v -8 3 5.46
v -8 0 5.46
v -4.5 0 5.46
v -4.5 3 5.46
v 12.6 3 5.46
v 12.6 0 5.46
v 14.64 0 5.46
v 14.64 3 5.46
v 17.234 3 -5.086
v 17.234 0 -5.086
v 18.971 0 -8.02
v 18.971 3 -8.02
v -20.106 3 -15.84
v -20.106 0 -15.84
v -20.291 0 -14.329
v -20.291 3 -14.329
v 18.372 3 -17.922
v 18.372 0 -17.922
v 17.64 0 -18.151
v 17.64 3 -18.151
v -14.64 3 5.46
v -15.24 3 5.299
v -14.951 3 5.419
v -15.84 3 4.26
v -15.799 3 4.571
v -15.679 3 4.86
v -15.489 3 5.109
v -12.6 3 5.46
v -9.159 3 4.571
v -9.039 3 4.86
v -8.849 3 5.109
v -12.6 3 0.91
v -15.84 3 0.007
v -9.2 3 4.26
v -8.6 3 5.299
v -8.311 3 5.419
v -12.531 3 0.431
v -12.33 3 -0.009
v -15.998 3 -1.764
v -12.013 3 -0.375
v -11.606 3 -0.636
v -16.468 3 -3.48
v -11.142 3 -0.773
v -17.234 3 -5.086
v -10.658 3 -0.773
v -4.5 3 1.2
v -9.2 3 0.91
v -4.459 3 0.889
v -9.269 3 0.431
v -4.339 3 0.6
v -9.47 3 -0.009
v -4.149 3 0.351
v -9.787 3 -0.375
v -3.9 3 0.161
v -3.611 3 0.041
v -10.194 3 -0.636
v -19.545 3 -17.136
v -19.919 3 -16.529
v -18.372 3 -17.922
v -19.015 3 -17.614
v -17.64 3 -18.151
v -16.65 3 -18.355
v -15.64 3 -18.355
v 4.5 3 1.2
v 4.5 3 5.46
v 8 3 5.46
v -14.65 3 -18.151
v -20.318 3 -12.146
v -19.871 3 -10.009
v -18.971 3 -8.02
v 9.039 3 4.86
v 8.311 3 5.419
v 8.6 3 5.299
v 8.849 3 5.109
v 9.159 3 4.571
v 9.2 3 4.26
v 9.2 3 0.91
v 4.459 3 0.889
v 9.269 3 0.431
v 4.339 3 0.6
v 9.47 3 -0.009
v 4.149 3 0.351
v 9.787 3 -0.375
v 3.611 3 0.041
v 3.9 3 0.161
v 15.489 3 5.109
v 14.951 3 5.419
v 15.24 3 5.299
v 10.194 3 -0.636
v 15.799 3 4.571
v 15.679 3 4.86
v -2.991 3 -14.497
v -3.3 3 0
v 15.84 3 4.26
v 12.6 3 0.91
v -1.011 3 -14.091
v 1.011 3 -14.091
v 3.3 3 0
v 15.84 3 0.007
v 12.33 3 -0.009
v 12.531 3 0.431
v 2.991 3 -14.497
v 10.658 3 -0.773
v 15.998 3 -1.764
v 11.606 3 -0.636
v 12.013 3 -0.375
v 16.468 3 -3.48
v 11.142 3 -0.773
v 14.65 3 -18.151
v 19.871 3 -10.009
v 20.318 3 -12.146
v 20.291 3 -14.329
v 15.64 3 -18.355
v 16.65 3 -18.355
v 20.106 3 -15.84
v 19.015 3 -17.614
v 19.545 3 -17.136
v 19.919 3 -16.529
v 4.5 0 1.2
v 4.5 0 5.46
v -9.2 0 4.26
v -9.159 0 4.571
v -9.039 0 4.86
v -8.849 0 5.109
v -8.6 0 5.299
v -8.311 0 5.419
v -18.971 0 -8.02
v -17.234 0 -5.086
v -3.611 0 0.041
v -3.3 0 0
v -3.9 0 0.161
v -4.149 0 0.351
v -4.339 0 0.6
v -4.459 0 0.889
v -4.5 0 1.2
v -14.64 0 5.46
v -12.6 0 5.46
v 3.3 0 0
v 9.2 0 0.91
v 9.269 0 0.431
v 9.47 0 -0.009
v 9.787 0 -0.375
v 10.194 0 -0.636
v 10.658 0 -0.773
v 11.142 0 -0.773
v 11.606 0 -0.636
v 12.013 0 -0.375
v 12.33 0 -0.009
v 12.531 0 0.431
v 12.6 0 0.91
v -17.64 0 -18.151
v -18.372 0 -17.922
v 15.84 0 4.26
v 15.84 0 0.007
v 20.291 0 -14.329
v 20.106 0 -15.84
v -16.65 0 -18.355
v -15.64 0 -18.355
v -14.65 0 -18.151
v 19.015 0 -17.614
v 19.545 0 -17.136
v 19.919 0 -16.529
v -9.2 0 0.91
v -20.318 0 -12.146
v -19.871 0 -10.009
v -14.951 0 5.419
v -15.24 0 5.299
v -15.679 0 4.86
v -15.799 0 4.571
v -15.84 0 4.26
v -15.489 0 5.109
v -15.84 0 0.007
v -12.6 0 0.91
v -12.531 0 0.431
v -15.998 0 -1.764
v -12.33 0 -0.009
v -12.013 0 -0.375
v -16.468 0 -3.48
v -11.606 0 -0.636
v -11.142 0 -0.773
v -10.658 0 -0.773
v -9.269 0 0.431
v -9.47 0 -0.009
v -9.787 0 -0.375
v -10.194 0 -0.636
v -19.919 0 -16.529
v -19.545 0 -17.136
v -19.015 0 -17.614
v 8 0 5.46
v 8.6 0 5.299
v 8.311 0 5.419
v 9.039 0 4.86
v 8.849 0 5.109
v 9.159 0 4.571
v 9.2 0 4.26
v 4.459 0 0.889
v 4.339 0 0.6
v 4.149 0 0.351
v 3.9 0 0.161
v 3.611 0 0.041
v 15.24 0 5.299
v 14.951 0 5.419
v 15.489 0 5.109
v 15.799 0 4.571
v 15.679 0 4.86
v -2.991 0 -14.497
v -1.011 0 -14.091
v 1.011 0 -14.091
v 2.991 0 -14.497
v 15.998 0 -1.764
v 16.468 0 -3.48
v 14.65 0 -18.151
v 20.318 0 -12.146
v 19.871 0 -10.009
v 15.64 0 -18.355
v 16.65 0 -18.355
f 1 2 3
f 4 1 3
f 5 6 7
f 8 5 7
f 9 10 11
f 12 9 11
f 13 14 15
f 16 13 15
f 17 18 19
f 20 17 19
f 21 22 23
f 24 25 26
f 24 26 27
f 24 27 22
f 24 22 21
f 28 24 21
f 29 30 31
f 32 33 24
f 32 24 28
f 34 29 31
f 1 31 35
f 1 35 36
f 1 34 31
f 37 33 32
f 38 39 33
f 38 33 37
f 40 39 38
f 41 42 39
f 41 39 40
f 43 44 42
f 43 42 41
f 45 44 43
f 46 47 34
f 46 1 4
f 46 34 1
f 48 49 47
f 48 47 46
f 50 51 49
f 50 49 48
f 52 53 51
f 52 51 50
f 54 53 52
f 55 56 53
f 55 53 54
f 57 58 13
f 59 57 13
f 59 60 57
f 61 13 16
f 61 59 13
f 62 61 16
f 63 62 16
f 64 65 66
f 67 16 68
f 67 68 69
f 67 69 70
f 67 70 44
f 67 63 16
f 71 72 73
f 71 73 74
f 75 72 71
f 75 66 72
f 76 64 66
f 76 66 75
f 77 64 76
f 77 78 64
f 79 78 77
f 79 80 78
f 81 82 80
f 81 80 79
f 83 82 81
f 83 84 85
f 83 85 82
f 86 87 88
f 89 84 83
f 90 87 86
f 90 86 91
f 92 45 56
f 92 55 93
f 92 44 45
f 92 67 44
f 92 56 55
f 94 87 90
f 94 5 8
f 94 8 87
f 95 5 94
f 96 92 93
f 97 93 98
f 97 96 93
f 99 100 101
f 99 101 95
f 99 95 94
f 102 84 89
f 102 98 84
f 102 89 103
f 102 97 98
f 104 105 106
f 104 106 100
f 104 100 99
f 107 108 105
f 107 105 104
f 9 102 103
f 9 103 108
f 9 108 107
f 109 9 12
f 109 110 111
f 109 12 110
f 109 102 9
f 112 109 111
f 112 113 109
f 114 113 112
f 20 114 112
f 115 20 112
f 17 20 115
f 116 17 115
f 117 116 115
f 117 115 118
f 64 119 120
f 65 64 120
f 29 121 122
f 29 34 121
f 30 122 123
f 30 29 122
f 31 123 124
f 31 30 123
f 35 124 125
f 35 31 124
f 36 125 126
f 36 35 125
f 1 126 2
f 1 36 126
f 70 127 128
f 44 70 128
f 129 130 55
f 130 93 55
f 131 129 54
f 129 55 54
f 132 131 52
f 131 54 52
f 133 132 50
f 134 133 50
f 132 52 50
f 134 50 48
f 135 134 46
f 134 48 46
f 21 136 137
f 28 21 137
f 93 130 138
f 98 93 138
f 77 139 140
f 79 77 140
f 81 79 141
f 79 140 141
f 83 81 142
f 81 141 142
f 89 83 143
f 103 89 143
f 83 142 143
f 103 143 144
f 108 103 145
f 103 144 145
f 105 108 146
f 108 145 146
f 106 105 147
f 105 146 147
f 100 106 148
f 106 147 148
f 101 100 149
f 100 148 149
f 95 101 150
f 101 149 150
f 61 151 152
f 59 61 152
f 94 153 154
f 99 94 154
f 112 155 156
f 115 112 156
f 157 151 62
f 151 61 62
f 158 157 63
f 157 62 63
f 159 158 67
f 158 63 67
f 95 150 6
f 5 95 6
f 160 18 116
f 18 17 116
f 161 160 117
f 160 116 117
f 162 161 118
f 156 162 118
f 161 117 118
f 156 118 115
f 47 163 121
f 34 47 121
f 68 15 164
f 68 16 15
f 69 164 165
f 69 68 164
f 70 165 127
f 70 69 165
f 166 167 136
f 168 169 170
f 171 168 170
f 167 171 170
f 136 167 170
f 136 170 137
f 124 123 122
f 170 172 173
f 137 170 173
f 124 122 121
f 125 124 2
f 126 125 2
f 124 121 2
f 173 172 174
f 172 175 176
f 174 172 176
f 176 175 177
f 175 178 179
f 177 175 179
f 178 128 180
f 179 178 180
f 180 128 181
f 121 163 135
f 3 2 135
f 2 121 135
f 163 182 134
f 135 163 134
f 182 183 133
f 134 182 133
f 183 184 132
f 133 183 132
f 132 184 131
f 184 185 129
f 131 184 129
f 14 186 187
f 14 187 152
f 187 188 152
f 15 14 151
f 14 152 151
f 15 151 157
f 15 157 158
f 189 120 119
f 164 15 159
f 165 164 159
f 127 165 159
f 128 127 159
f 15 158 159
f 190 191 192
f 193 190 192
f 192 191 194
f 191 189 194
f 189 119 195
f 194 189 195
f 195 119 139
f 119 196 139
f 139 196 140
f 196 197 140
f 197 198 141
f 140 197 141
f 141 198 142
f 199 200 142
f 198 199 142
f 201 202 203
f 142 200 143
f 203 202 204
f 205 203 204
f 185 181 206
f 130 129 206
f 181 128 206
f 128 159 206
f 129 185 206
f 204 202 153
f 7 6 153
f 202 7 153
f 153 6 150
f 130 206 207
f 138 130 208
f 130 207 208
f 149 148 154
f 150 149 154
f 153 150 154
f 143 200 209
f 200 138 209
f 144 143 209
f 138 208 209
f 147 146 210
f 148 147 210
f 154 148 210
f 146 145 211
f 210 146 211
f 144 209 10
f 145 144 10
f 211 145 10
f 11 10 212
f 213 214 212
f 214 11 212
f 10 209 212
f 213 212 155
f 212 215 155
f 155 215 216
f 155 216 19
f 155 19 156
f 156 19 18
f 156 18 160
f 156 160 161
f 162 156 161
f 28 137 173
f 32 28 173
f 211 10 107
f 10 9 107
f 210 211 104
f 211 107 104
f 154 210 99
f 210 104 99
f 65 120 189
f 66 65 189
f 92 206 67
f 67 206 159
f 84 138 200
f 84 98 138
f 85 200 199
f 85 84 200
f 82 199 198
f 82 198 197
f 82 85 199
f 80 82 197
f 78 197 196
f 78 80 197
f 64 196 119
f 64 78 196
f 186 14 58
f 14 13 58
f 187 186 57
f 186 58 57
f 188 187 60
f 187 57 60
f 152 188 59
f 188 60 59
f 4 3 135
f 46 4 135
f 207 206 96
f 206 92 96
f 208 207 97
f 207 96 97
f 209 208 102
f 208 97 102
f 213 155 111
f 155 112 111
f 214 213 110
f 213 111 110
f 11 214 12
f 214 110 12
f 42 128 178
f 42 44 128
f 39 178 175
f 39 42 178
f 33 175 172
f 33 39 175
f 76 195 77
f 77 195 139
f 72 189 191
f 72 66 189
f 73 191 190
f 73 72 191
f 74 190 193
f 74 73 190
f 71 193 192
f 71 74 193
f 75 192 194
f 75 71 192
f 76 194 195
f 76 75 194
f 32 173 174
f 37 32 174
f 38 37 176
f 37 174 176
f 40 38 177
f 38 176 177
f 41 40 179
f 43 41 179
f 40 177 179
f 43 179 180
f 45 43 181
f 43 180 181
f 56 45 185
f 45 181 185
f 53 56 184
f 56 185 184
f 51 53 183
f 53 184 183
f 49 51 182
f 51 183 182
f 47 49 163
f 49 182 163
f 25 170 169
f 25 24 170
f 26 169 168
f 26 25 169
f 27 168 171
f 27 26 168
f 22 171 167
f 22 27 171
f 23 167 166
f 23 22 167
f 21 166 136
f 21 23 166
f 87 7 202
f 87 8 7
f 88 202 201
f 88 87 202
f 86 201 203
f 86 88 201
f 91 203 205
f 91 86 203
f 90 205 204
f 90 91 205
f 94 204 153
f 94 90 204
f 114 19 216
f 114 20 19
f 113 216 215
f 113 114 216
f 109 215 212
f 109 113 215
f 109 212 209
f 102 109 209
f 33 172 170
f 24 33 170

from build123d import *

# Parameters (mm, degrees)
BOSS_EXTRUDE1_DEPTH = 3
FILLET1_R           = 1.2
FILLET2_R           = 5
FILLET3_R           = 10
FILLET4_R           = 2.5


with BuildPart() as part:
    # Sketch1 → Boss-Extrude1 (new body)
    with BuildSketch(Plane(origin=(0, 0, 0), x_dir=(1, 0, 0), z_dir=(0, 1, 0))):
        with BuildLine():
            Line((-4.5, 0), (4.5, 0))
            Line((4.5, 0), (4.5, -5.46))
            Line((4.5, -5.46), (9.2, -5.46))
            Line((9.2, -5.46), (9.2, -0.91))
            ThreePointArc((9.2, -0.91), (10.9, 0.79), (12.6, -0.91))
            Line((12.6, -0.91), (12.6, -5.46))
            Line((12.6, -5.46), (15.84, -5.46))
            Line((15.84, -5.46), (15.84, 2.73))
            Line((15.84, 2.73), (20.705, 10.95))
            Line((20.705, 10.95), (19.91, 17.44))
            Line((19.91, 17.44), (16.145, 18.62))
            Line((16.145, 18.62), (0, 13.56))
            Line((0, 13.56), (-16.145, 18.62))
            Line((-16.145, 18.62), (-19.91, 17.44))
            Line((-19.91, 17.44), (-20.705, 10.95))
            Line((-20.705, 10.95), (-15.84, 2.73))
            Line((-15.84, 2.73), (-15.84, -5.46))
            Line((-15.84, -5.46), (-12.6, -5.46))
            Line((-12.6, -5.46), (-12.6, -0.91))
            ThreePointArc((-12.6, -0.91), (-10.9, 0.79), (-9.2, -0.91))
            Line((-9.2, -0.91), (-9.2, -5.46))
            Line((-9.2, -5.46), (-4.5, -5.46))
            Line((-4.5, -5.46), (-4.5, 0))
        make_face()
    extrude(amount=BOSS_EXTRUDE1_DEPTH)

    # Fillet1
    fillet1_edges = [part.edges().sort_by_distance(p)[0] for p in [
        (4.5, 1.5, 0),
        (-4.5, 1.5, 0),
        (-9.2, 1.5, 5.46),
        (-15.84, 1.5, 5.46),
        (15.84, 1.5, 5.46),
        (9.2, 1.5, 5.46),
    ]]
    fillet(fillet1_edges, radius=FILLET1_R)

    # Fillet2
    fillet2_edges = [part.edges().sort_by_distance(p)[0] for p in [
        (-16.145, 1.5, -18.62),
        (16.145, 1.5, -18.62),
    ]]
    fillet(fillet2_edges, radius=FILLET2_R)

    # Fillet3
    fillet3_edges = [part.edges().sort_by_distance(p)[0] for p in [
        (-15.84, 1.5, -2.73),
        (-20.705, 1.5, -10.95),
        (0, 1.5, -13.56),
        (20.705, 1.5, -10.95),
        (15.84, 1.5, -2.73),
    ]]
    fillet(fillet3_edges, radius=FILLET3_R)

    # Fillet4
    fillet4_edges = [part.edges().sort_by_distance(p)[0] for p in [
        (-19.91, 1.5, -17.44),
        (19.91, 1.5, -17.44),
    ]]
    fillet(fillet4_edges, radius=FILLET4_R)


solid = part.part
